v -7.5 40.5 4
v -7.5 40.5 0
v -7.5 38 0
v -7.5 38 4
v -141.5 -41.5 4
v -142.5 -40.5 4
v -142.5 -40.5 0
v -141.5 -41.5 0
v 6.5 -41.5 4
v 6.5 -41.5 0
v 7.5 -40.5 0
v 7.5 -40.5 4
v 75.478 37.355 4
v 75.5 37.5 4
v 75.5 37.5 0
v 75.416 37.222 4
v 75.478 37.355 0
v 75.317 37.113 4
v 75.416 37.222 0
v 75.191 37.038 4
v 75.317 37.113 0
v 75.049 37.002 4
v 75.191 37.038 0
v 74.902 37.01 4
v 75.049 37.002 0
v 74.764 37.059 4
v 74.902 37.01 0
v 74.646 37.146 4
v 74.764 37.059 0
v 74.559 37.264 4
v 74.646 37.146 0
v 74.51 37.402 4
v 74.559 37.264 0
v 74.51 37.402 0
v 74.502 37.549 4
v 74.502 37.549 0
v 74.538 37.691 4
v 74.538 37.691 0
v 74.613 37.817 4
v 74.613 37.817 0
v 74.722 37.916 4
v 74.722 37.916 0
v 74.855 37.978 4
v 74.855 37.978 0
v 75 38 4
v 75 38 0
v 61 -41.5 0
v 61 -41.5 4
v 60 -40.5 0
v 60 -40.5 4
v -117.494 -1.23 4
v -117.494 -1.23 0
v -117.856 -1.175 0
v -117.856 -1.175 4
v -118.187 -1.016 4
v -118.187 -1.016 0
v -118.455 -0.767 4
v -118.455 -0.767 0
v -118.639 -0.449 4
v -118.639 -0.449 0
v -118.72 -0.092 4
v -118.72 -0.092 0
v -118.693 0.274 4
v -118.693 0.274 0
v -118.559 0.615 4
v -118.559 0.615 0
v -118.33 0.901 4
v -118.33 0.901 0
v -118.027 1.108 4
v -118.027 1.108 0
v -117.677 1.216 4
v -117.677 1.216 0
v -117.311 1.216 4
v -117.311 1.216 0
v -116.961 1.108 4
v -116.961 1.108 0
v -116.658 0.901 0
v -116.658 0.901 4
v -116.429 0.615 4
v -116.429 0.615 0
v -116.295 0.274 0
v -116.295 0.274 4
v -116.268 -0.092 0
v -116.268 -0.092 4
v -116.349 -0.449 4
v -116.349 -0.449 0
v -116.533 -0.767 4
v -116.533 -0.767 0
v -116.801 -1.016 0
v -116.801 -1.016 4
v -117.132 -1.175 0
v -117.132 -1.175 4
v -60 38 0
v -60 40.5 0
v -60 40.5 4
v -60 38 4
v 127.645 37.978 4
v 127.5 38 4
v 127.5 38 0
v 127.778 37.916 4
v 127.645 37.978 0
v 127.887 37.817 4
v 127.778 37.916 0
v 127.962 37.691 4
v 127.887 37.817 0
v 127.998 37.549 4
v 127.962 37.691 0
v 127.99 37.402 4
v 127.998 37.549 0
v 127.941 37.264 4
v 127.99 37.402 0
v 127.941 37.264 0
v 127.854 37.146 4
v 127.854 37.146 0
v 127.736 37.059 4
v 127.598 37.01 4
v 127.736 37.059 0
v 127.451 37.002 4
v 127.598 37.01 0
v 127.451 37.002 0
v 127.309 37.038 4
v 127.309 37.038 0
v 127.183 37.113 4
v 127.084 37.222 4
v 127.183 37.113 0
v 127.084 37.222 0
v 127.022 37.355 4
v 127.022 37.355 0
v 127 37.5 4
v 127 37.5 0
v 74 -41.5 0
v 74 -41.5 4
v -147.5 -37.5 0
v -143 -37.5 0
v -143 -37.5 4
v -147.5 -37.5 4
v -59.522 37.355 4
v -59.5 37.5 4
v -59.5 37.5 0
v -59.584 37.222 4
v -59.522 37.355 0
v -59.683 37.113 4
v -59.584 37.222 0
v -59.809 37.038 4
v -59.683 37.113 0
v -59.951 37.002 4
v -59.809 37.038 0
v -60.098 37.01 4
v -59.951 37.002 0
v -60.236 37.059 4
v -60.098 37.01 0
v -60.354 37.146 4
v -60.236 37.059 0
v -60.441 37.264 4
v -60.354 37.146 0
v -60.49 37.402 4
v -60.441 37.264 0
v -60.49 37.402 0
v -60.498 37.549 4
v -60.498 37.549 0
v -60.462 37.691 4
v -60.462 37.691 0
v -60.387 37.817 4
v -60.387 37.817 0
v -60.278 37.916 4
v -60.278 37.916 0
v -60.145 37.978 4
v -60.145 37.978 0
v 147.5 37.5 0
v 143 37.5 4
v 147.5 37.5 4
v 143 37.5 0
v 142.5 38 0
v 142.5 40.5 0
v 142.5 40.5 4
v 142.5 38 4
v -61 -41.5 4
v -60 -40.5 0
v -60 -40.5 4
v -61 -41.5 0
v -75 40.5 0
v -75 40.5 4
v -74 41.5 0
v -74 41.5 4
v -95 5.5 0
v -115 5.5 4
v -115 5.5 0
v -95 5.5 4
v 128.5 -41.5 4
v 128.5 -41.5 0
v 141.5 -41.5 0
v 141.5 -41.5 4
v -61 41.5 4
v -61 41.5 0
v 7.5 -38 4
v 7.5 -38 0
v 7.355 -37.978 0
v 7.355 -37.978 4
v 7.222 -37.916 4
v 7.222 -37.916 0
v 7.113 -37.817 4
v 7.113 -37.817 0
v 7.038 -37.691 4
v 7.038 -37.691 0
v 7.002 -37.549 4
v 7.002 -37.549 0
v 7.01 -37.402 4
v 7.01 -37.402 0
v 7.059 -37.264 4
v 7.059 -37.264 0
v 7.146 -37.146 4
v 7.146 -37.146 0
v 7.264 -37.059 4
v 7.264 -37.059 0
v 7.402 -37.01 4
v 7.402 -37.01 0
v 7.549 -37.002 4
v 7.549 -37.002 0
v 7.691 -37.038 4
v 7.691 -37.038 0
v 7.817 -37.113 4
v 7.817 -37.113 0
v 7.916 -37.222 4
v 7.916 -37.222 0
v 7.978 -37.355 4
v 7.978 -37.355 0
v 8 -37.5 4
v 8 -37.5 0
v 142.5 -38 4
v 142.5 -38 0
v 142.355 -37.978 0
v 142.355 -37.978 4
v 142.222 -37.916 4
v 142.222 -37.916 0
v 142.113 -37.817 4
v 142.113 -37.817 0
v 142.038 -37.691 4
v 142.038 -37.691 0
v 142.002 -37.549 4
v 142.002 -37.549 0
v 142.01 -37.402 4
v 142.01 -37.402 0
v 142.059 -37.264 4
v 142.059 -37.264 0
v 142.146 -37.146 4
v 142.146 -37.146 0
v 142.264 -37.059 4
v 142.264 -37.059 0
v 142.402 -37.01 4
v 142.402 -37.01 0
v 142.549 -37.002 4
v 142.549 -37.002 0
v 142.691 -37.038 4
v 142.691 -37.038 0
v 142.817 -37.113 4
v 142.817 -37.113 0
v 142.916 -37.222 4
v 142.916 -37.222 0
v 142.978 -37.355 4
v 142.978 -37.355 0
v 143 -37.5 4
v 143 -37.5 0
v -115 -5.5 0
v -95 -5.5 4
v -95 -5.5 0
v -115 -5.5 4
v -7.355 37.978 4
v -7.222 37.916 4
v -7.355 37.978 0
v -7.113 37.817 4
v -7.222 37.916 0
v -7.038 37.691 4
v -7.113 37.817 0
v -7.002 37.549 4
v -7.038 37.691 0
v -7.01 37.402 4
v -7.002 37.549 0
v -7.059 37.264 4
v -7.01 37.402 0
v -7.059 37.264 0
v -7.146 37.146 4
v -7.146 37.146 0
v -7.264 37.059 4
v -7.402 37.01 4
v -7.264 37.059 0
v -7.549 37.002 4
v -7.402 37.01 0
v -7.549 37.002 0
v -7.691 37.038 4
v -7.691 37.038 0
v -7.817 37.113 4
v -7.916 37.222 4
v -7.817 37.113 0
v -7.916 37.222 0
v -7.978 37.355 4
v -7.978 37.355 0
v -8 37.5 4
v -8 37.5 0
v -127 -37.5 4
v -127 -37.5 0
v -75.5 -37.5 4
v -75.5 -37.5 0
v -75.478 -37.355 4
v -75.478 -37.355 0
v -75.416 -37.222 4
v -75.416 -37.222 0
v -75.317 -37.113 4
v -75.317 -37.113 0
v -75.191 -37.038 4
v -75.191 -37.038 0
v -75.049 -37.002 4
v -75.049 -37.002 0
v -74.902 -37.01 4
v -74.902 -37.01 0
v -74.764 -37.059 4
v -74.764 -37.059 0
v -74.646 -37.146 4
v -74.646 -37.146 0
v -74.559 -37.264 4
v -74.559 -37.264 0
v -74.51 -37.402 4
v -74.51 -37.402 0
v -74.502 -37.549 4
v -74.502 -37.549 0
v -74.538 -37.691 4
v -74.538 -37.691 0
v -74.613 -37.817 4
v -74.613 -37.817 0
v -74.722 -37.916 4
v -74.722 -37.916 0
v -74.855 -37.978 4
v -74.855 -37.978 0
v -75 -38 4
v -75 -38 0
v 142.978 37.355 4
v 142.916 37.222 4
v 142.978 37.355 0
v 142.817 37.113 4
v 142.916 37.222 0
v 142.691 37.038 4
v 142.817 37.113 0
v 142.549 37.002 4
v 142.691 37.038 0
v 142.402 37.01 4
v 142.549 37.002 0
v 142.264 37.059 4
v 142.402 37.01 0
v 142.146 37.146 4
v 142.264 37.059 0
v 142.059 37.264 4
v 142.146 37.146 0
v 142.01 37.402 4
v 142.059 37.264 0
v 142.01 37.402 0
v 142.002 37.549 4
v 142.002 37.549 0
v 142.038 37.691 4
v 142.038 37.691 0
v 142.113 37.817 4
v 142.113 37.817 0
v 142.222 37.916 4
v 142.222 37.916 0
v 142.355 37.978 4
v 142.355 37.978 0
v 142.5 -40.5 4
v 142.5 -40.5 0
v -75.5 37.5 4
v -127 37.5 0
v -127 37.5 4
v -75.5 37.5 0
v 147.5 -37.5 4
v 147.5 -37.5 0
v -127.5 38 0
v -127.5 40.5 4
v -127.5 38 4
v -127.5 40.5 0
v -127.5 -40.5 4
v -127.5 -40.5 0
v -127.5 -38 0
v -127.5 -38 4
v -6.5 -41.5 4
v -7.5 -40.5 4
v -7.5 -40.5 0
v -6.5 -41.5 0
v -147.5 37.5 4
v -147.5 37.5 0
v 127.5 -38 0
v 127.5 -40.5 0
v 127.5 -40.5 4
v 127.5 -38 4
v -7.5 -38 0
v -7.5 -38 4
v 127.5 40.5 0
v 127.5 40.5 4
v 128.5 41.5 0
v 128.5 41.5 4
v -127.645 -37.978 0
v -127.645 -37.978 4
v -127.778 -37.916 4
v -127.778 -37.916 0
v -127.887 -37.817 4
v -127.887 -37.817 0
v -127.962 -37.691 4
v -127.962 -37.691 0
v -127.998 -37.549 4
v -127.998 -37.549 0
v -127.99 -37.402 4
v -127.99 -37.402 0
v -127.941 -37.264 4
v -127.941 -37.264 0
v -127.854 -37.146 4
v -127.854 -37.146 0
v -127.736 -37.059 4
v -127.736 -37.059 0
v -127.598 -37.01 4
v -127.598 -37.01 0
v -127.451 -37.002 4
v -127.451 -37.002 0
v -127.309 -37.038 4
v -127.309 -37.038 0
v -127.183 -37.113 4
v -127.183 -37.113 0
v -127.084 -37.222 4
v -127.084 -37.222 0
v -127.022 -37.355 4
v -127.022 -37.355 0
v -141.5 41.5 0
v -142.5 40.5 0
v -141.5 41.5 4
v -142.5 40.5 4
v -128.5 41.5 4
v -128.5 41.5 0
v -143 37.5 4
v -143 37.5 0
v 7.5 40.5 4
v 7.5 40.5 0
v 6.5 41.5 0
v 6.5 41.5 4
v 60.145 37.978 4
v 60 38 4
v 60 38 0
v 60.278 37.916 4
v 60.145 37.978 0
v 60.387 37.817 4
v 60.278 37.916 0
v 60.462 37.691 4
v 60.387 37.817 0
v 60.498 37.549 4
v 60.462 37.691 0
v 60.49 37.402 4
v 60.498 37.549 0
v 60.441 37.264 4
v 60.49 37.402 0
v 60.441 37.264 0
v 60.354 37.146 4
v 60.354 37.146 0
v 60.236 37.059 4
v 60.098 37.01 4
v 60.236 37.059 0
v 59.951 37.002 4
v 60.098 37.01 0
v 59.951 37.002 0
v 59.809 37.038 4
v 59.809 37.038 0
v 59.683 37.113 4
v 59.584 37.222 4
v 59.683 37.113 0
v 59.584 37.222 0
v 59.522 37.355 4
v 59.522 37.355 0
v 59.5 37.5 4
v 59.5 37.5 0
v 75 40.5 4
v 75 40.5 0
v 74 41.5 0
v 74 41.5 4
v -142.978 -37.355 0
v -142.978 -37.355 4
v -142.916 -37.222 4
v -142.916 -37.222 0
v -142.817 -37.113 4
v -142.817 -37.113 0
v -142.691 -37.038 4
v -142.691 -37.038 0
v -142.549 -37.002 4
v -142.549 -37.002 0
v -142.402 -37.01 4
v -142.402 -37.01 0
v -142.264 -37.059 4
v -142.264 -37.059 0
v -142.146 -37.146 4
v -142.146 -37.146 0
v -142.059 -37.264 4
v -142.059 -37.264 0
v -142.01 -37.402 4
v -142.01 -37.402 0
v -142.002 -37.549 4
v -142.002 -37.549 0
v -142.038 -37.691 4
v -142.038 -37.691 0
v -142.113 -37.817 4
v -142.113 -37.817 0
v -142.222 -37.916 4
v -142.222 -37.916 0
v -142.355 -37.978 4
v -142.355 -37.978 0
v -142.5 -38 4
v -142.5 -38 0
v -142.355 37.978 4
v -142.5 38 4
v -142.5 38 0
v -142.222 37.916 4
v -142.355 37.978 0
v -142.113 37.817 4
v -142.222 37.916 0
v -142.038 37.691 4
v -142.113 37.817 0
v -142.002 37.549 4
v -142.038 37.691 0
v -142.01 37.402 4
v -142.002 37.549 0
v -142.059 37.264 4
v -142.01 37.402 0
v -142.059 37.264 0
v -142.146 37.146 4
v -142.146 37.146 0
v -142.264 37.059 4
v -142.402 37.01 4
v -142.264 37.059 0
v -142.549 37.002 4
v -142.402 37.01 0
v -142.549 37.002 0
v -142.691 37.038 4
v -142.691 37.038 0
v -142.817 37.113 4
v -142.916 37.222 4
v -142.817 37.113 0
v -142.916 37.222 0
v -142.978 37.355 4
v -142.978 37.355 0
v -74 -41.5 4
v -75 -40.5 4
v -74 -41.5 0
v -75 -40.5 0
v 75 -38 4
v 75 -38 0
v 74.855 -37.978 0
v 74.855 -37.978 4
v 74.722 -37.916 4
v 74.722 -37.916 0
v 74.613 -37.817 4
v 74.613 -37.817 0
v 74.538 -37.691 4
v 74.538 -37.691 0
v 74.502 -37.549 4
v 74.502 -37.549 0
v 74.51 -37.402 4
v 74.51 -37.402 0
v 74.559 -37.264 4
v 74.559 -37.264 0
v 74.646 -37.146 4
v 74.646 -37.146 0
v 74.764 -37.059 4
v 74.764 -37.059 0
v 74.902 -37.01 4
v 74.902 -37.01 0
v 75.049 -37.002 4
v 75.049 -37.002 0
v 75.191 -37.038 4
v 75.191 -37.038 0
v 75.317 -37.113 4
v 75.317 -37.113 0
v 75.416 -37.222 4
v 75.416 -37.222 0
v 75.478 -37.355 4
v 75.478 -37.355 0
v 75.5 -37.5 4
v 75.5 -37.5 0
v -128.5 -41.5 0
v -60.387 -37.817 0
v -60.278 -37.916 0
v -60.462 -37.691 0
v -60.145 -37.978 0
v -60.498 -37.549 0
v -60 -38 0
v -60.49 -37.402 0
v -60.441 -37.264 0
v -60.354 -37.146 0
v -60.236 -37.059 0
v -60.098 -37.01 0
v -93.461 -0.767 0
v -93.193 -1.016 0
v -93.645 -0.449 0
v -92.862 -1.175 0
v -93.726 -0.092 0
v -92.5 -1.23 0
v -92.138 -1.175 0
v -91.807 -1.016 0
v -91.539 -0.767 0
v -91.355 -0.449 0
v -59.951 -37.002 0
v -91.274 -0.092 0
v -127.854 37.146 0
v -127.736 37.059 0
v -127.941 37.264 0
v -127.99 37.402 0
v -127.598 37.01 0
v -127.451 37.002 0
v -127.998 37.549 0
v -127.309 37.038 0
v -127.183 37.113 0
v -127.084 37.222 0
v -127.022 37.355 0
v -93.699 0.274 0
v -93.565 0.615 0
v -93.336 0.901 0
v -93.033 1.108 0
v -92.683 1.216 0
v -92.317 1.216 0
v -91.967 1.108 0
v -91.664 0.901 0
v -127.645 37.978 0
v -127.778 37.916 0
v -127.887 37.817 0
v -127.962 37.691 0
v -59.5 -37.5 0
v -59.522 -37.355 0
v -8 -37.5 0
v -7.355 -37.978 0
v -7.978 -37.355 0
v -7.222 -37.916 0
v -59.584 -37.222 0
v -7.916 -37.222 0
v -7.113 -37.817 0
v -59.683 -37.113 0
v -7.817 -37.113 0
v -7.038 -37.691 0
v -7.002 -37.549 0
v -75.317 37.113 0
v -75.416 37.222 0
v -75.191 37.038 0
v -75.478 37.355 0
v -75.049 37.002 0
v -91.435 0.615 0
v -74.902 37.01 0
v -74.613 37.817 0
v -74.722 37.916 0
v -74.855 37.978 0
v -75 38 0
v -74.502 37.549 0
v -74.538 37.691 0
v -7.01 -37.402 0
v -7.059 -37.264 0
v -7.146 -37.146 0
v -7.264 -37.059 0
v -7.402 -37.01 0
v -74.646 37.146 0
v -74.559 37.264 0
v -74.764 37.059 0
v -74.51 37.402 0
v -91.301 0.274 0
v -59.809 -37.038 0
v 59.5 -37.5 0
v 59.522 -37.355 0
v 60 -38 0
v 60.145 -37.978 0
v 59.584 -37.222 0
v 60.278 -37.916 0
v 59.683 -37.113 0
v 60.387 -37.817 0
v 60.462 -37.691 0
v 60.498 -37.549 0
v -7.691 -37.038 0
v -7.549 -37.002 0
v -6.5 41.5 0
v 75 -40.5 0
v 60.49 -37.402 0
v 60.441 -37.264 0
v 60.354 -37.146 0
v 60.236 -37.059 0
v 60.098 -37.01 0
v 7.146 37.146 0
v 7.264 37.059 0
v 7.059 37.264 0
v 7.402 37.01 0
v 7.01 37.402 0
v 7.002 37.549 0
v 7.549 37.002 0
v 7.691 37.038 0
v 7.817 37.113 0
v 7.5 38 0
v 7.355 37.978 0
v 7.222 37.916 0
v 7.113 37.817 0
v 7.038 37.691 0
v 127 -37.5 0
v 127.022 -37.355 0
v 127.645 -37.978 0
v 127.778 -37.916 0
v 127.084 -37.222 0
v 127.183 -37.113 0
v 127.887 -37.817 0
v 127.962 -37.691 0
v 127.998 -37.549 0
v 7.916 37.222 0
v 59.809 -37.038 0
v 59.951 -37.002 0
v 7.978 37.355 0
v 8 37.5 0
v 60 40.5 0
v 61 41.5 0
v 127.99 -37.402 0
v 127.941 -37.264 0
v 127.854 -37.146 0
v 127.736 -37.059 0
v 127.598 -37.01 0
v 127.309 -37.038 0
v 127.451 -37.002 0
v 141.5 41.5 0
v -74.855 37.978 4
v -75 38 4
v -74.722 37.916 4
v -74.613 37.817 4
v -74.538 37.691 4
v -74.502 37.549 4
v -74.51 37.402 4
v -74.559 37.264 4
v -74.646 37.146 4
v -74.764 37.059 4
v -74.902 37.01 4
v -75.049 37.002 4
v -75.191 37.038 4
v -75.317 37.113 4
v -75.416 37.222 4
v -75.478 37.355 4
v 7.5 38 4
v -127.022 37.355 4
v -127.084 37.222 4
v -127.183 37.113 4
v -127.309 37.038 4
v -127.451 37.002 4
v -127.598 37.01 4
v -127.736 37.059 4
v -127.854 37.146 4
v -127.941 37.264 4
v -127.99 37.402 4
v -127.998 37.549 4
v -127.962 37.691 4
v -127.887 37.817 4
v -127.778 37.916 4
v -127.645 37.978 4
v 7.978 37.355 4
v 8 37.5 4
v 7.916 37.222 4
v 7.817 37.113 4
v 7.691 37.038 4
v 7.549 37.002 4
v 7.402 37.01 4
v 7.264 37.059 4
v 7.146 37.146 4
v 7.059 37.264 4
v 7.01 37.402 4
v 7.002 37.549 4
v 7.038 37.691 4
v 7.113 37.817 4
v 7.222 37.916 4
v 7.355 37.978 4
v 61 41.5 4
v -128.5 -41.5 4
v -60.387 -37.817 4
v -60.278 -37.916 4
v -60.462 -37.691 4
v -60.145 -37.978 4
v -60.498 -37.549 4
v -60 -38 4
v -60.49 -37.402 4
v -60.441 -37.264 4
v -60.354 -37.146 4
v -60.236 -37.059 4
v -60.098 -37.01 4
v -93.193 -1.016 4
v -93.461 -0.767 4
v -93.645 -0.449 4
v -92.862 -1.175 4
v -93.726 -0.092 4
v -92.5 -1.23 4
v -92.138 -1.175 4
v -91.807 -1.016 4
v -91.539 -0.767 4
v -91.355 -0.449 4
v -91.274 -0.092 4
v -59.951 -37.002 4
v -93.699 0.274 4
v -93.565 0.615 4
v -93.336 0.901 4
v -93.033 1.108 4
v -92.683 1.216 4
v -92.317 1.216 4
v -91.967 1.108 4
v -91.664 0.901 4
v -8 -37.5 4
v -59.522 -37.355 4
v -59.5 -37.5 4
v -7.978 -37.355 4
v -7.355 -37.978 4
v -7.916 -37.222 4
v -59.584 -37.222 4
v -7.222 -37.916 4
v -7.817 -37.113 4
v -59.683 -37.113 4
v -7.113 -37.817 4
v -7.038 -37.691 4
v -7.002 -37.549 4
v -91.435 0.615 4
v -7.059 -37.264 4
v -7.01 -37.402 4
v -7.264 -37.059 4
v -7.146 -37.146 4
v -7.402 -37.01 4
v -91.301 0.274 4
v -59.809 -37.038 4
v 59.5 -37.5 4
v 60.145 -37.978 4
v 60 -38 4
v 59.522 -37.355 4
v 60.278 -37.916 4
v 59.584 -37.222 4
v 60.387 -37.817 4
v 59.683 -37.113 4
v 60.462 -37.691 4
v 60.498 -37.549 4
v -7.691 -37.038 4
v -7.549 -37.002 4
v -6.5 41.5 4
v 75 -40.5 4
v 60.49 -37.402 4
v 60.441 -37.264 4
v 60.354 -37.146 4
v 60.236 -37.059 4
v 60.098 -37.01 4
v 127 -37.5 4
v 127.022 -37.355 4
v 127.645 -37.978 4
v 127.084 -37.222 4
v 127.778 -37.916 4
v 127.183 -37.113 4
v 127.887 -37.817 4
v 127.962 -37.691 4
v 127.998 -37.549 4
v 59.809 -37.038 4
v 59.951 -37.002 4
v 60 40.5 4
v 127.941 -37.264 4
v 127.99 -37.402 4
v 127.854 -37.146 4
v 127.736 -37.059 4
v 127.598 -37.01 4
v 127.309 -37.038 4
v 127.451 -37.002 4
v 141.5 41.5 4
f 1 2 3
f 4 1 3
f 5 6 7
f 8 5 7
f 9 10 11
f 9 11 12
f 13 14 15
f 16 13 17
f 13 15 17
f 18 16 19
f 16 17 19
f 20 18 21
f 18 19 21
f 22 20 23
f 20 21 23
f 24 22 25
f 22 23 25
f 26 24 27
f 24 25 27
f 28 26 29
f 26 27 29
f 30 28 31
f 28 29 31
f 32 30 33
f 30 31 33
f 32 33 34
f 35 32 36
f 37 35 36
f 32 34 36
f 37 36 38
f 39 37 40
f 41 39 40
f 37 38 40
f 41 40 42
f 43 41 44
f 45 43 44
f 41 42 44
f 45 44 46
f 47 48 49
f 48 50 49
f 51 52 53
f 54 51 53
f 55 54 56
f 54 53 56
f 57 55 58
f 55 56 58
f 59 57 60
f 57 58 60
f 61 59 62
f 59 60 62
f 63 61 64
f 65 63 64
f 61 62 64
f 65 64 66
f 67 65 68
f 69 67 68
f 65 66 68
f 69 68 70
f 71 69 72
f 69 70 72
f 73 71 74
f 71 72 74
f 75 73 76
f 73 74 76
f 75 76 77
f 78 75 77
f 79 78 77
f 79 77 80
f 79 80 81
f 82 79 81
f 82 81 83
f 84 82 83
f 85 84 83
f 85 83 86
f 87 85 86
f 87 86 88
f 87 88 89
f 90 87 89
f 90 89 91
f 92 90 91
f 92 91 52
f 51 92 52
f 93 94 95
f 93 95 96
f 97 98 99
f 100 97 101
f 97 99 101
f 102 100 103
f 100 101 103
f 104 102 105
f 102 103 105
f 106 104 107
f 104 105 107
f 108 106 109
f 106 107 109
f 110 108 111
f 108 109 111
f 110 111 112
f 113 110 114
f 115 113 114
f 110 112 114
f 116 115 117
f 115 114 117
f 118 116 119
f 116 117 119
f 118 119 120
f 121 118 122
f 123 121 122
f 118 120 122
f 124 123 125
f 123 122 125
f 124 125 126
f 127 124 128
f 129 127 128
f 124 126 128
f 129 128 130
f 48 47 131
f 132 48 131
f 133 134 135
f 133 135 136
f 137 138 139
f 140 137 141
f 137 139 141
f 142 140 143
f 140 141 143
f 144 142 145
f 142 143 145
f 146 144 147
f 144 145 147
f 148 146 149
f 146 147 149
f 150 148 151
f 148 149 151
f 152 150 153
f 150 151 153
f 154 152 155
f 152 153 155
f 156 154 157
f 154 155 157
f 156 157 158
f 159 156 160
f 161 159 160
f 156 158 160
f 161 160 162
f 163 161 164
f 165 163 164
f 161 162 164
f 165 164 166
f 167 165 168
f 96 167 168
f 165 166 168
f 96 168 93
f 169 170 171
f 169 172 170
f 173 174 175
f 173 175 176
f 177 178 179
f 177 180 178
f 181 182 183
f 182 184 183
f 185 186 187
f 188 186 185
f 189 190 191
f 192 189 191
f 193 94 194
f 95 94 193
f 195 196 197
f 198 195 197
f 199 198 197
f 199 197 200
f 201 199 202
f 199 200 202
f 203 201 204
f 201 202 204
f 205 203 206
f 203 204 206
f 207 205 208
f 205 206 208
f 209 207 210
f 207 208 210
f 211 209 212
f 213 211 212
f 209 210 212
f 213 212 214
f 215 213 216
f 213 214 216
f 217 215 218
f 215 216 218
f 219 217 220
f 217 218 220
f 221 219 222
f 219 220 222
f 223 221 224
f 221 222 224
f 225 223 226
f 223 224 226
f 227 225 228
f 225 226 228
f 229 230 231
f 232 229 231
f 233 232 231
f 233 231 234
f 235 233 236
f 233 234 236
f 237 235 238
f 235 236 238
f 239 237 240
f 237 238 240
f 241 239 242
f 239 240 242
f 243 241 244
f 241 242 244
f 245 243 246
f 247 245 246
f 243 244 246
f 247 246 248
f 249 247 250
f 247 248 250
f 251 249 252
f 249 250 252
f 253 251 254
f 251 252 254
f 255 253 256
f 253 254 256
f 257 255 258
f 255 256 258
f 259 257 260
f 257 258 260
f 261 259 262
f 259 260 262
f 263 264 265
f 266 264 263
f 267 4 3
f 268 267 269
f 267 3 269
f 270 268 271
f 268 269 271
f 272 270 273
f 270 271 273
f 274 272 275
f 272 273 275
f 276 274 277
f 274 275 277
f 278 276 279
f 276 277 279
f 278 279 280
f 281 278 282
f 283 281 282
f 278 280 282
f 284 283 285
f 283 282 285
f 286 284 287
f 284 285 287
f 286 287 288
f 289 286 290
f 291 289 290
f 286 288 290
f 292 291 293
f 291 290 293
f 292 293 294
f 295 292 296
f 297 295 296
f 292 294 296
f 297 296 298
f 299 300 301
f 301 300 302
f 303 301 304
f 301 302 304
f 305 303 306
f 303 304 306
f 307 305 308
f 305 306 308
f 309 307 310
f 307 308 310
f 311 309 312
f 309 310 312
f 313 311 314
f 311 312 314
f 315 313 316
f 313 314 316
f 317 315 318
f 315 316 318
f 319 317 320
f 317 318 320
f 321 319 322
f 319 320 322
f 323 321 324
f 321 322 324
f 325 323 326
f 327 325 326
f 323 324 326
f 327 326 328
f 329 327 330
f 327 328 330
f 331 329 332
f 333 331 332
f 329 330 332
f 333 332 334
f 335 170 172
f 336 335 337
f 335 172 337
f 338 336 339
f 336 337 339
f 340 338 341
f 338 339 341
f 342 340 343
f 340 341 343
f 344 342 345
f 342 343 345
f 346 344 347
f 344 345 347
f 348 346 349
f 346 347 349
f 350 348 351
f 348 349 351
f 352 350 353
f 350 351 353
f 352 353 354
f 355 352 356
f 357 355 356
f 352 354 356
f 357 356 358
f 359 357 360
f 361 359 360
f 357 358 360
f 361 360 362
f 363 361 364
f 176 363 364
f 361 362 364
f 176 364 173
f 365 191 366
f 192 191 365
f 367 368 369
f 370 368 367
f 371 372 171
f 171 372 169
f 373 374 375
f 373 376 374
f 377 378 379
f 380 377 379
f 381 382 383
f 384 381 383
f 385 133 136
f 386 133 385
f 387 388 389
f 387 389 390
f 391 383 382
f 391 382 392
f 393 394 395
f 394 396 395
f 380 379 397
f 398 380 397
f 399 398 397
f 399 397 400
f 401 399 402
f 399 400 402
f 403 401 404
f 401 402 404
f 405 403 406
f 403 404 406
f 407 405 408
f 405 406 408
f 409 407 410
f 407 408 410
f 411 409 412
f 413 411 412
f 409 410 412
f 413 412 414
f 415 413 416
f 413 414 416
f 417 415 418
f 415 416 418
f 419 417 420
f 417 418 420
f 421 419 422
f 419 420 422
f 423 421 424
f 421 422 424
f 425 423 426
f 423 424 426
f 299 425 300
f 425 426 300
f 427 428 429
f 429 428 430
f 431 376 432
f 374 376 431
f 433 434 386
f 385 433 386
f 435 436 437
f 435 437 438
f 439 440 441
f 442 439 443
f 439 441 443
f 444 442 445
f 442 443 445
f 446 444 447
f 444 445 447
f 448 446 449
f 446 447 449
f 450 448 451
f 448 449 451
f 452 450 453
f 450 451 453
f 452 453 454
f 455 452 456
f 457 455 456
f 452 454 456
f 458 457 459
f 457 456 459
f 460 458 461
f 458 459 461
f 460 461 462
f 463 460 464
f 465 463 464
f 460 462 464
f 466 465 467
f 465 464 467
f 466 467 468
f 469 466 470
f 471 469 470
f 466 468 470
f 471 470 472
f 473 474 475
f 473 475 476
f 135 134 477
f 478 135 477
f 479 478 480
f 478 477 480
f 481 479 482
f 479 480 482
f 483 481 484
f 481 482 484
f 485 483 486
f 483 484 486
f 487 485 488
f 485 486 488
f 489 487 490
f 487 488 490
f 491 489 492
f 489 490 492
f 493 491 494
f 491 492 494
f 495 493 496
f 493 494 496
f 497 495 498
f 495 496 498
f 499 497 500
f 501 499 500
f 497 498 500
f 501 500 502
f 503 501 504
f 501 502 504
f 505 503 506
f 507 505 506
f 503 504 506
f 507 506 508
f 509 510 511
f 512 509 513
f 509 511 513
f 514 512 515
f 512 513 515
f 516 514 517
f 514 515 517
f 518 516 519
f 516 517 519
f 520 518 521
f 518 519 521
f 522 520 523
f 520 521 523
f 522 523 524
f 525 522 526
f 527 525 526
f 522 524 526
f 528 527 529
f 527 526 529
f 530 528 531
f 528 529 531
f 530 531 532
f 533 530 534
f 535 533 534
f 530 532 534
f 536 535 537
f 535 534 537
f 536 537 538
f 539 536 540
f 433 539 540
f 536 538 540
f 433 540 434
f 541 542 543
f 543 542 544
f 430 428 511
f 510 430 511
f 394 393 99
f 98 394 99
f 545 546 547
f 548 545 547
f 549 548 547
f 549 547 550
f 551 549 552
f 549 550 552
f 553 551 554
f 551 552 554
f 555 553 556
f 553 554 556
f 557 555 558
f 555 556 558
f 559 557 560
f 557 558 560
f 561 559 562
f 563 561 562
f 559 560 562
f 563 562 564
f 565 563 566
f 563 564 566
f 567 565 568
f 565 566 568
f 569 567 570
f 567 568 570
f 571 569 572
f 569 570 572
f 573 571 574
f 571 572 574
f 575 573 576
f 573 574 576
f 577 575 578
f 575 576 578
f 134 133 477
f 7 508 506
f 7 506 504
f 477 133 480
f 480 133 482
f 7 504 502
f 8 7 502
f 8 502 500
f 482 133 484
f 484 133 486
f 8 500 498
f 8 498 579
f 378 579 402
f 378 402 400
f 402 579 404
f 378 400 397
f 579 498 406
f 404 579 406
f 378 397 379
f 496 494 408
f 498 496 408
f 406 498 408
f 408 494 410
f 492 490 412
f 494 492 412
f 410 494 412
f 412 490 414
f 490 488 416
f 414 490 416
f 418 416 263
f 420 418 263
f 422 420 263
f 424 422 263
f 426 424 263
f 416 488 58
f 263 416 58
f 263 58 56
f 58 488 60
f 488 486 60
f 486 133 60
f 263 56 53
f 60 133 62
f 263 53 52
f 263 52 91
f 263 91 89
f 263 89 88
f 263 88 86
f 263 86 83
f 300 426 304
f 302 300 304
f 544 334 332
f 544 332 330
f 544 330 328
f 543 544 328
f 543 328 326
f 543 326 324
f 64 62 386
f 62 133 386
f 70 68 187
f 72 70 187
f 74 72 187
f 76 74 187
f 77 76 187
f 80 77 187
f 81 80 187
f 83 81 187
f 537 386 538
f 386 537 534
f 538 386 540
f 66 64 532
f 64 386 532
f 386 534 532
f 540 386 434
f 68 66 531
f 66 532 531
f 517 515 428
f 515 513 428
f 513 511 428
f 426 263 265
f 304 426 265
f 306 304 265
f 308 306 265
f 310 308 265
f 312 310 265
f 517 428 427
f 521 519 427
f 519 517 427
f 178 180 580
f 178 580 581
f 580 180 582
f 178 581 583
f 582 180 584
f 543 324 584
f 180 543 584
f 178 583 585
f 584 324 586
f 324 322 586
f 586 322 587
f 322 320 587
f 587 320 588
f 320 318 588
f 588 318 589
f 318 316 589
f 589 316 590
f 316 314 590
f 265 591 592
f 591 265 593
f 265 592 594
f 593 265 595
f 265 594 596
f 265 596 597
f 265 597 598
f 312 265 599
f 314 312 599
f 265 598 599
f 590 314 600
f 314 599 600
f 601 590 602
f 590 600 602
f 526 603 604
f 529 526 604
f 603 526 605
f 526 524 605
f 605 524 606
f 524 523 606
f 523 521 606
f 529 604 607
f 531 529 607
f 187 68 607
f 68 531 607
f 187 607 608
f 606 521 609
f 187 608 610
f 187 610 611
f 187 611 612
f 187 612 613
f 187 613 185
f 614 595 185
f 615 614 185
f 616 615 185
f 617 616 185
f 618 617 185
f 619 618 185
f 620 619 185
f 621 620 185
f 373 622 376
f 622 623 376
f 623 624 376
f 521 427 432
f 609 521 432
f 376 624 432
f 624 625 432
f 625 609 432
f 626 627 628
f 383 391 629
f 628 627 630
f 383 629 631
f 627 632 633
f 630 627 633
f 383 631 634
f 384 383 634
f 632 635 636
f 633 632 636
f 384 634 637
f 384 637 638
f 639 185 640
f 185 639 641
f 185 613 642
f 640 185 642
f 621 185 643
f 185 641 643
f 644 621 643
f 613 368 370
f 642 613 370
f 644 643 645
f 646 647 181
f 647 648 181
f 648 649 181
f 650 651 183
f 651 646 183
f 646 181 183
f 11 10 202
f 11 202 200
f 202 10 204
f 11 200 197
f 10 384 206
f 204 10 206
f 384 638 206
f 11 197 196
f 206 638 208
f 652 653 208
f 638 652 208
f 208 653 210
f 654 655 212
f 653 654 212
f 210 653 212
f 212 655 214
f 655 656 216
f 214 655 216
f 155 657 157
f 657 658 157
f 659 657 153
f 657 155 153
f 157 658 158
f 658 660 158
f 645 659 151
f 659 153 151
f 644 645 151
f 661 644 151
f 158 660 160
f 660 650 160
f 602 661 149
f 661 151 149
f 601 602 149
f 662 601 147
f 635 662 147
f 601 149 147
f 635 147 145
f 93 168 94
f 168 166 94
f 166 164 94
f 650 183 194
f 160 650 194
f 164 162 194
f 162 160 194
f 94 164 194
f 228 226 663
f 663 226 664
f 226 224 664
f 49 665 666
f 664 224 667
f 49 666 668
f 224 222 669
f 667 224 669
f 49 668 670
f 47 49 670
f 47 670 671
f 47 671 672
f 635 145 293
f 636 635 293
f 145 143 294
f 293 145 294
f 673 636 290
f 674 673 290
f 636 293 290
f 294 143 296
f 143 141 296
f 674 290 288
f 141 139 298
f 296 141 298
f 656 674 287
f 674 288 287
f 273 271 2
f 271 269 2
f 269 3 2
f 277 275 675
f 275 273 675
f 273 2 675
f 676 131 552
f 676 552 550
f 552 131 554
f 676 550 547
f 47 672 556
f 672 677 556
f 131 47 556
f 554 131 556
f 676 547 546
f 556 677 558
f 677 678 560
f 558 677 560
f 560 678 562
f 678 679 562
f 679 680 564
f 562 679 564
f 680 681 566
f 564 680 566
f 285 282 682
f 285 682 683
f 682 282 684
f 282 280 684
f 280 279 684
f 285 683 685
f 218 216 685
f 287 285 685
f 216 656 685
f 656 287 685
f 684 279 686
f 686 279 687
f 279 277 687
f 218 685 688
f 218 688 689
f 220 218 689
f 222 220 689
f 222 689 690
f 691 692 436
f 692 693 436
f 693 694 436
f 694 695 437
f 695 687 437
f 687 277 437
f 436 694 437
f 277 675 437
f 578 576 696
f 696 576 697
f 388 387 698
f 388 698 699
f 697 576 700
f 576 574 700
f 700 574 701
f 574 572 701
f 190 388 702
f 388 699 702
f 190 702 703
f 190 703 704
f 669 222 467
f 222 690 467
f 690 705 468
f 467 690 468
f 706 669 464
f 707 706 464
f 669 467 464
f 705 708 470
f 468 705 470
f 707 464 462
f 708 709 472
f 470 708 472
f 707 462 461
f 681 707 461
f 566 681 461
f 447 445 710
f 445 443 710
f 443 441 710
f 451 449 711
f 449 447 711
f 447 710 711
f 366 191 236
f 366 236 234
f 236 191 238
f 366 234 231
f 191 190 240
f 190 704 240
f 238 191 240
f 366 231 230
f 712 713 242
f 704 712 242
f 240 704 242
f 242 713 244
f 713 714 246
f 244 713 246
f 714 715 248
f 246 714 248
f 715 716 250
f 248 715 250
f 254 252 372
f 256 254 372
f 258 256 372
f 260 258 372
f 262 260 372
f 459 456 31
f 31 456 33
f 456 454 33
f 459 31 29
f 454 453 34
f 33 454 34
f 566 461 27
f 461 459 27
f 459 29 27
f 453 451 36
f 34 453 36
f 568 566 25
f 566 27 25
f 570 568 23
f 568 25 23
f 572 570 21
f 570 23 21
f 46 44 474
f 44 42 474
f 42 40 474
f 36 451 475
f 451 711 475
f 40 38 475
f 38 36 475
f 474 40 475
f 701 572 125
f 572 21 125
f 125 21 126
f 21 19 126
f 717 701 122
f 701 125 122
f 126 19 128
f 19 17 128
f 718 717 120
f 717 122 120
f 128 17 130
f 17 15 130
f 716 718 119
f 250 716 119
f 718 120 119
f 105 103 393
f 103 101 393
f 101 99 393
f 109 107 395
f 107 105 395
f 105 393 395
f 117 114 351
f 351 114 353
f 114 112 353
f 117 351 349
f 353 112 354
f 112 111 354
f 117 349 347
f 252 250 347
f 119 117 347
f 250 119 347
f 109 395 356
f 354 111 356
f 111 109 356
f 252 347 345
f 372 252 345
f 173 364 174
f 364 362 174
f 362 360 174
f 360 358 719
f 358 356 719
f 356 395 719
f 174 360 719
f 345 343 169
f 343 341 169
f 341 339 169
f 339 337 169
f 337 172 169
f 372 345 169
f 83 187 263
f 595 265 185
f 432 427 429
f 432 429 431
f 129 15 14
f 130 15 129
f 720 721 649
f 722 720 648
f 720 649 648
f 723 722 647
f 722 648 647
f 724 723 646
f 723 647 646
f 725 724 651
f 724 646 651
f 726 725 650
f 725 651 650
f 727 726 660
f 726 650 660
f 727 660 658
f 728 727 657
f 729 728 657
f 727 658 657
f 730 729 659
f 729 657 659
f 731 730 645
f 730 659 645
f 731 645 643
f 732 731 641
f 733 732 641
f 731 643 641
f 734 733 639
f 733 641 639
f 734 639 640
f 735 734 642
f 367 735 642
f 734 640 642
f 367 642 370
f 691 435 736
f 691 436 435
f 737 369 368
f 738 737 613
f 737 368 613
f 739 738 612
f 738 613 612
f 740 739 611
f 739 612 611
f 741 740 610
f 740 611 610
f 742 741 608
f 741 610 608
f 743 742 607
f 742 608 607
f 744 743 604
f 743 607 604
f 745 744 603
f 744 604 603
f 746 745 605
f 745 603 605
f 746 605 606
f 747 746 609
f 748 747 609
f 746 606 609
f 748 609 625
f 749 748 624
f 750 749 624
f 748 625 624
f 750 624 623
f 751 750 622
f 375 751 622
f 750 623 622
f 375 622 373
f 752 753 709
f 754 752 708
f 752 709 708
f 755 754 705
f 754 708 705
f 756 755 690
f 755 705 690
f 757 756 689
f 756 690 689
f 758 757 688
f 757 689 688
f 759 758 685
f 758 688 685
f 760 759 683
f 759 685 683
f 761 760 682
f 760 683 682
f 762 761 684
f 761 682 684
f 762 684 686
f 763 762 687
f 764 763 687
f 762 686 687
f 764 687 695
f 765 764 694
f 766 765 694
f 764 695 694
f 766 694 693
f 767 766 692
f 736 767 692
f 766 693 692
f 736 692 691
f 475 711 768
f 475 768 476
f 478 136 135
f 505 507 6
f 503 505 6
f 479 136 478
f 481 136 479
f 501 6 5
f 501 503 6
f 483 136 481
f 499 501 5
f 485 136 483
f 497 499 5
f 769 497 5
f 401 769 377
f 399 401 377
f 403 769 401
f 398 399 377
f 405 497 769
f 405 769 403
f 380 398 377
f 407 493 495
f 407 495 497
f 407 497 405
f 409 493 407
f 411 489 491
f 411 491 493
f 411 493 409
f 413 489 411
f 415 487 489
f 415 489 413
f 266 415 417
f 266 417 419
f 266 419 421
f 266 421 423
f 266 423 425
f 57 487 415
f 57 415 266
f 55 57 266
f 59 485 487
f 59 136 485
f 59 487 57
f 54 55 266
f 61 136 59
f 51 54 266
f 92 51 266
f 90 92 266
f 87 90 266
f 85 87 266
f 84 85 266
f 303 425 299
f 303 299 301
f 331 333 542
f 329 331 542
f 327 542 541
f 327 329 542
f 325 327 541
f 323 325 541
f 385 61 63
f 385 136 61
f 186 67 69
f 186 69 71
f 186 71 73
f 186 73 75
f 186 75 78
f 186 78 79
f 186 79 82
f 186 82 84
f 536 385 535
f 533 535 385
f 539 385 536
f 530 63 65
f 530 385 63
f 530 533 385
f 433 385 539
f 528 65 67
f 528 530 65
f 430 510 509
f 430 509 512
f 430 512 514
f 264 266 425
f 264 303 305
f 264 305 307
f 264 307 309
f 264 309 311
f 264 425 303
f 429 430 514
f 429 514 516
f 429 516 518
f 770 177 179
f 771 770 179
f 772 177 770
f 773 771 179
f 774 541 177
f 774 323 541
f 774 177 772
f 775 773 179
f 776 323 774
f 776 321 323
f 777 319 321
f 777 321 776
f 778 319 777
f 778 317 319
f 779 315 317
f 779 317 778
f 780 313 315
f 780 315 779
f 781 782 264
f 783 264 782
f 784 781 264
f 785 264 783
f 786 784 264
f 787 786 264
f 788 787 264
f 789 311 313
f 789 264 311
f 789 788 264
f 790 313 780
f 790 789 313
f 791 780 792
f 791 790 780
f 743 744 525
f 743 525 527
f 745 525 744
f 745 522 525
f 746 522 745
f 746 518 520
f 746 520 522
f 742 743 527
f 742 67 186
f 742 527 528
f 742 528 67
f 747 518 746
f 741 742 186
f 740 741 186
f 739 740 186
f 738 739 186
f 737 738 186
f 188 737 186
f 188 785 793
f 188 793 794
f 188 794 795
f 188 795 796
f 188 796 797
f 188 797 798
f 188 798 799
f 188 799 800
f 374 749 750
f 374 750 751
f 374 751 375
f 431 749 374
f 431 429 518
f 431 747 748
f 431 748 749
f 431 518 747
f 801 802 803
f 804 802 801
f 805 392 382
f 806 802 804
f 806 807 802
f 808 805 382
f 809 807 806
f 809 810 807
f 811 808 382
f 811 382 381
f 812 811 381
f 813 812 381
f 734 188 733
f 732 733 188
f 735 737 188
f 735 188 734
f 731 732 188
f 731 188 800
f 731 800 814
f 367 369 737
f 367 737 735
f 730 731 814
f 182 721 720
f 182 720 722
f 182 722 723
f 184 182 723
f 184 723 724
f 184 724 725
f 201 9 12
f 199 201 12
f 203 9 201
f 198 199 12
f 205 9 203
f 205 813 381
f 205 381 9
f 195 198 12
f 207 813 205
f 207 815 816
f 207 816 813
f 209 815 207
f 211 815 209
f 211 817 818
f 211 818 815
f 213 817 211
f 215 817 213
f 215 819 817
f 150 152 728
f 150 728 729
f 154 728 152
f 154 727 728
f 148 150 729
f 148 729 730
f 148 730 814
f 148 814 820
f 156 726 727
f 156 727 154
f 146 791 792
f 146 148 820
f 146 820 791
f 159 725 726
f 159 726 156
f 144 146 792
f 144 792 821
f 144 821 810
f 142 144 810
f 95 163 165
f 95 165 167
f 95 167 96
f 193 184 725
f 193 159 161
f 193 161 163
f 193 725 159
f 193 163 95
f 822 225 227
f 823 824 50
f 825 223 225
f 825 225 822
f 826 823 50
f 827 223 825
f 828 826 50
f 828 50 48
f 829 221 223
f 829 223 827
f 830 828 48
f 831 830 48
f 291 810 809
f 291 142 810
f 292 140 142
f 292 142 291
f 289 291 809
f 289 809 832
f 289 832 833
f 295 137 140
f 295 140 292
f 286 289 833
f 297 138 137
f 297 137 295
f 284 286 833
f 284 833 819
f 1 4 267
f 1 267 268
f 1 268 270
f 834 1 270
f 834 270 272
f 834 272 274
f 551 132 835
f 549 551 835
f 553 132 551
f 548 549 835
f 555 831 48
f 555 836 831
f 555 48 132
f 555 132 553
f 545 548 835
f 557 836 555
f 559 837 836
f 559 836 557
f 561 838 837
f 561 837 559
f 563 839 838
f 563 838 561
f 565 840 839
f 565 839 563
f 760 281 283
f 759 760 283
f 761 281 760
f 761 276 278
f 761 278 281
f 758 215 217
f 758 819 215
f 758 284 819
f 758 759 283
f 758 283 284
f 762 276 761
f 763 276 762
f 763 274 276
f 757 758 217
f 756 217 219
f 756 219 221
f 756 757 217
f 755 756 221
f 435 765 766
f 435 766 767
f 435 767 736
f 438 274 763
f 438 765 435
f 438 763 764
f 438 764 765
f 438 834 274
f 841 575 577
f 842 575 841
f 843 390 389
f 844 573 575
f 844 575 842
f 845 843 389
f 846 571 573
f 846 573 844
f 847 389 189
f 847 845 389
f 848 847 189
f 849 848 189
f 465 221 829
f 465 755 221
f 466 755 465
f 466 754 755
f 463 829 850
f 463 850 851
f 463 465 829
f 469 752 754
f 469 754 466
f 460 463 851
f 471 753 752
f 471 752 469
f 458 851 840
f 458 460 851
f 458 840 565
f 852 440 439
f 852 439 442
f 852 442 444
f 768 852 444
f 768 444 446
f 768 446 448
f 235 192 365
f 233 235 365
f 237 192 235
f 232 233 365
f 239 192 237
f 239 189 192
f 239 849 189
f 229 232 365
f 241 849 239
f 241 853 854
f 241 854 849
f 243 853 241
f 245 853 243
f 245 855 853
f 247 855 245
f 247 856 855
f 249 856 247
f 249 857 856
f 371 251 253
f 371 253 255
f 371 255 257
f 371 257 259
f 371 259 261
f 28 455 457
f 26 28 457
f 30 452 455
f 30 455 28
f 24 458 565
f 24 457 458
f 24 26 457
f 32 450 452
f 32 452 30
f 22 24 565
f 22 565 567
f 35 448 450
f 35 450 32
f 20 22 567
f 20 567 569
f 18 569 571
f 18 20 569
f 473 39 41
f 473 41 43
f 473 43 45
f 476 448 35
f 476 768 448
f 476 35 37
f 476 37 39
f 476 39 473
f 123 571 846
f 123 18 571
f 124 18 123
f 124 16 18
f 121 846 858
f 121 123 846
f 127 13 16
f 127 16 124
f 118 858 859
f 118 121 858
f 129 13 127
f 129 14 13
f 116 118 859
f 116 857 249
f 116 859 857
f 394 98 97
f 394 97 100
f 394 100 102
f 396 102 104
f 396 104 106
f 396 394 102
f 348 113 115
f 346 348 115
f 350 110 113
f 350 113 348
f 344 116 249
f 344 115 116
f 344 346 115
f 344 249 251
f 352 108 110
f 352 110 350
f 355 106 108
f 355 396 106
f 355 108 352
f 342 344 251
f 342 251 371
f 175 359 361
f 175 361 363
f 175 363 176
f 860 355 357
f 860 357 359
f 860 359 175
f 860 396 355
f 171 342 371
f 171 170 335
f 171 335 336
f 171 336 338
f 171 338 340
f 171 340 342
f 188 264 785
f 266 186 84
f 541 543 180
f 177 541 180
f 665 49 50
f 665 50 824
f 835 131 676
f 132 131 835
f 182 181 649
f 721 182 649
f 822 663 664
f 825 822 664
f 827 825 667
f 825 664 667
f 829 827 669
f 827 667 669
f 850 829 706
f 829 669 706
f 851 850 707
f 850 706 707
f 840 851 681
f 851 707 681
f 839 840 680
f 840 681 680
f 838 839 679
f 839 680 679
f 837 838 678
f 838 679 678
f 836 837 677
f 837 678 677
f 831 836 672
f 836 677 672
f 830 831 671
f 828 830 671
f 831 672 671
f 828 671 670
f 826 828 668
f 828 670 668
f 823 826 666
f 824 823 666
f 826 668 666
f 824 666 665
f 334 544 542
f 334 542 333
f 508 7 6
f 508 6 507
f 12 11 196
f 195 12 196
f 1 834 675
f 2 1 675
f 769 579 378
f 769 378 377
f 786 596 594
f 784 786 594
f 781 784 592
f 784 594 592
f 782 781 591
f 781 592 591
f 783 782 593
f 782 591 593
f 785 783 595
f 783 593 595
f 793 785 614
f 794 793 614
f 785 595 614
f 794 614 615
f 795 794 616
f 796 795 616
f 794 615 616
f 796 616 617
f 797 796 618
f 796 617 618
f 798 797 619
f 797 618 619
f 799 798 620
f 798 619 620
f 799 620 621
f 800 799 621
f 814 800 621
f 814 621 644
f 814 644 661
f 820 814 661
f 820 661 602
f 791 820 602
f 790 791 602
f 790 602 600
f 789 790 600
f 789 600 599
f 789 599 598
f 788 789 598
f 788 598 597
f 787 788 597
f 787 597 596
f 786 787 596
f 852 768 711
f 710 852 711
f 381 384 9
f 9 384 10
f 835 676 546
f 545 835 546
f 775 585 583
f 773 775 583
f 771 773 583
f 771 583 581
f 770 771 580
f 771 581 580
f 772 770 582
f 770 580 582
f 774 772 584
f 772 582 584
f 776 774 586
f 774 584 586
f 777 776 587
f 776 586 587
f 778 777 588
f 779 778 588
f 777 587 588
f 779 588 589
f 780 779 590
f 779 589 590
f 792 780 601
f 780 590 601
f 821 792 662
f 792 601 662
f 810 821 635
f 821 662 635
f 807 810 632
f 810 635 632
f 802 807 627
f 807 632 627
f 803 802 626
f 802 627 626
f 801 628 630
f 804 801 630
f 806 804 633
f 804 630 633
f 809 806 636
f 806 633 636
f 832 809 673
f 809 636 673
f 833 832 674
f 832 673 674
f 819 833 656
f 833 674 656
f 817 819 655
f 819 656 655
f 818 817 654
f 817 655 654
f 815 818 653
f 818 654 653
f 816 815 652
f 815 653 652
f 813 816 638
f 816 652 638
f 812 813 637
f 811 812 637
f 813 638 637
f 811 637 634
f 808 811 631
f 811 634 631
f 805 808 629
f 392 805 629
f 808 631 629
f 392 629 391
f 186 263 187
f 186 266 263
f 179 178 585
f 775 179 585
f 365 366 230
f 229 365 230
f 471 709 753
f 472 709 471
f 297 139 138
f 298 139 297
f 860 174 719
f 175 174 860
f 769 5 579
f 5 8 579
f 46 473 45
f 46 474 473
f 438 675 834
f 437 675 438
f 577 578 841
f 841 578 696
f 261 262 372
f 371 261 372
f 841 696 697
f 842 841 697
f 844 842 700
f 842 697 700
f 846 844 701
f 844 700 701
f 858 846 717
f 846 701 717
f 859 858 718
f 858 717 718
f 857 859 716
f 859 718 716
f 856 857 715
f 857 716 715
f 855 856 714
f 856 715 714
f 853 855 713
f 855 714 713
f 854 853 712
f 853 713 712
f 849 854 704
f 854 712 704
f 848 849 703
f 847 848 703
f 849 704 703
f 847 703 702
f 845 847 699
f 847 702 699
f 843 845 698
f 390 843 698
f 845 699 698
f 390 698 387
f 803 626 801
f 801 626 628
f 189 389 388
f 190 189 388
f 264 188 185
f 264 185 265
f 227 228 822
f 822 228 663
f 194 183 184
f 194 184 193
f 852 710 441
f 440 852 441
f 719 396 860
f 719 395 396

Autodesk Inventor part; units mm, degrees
ref_plane "Plan YZ" through (0, 0, 0) normal (1, 0, 0) x (0, 1, 0)
ref_plane "Plan XZ" through (0, 0, 0) normal (0, 1, 0) x (-1, 0, 0)
ref_plane "Plan XY" through (0, 0, 0) normal (0, 0, 1) x (1, 0, 0)
sketch "Esquisse1" plane through (0, 0, 0) normal (0, 0, 1) x (1, 0, 0)
  line L0 (-142.5, 41.5) -> (-142.5, 37.5)
  line L1 (-142.5, 41.5) -> (-127.5, 41.5)
  line L2 (-127.5, 41.5) -> (-127.5, 37.5)
  line L3 (0, -58.1) -> (0, 58.1) construction
  line L4 (-206.5, 0) -> (206.5, 0) construction
  line L5 (-75, 41.5) -> (-75, 37.5)
  line L6 (-75, 41.5) -> (-60, 41.5)
  line L7 (-60, 41.5) -> (-60, 37.5)
  line L8 (-7.5, 41.5) -> (-7.5, 37.5)
  line L9 (-7.5, 41.5) -> (7.5, 41.5)
  line L10 (7.5, 41.5) -> (7.5, 37.5)
  line L11 (60, 41.5) -> (60, 37.5)
  line L12 (60, 41.5) -> (75, 41.5)
  line L13 (75, 41.5) -> (75, 37.5)
  line L14 (127.5, 41.5) -> (127.5, 37.5)
  line L15 (127.5, 41.5) -> (142.5, 41.5)
  line L16 (142.5, 41.5) -> (142.5, 37.5)
  line L17 (-127.5, 37.5) -> (-75, 37.5)
  line L18 (-60, 37.5) -> (-7.5, 37.5)
  line L19 (7.5, 37.5) -> (60, 37.5)
  line L20 (75, 37.5) -> (127.5, 37.5)
  line L21 (142.5, 37.5) -> (147.5, 37.5)
  line L22 (-142.5, 37.5) -> (-147.5, 37.5)
  line L23 (-142.5, -41.5) -> (-142.5, -37.5)
  line L24 (-142.5, -41.5) -> (-127.5, -41.5)
  line L25 (-127.5, -41.5) -> (-127.5, -37.5)
  line L26 (-75, -41.5) -> (-75, -37.5)
  line L27 (-75, -41.5) -> (-60, -41.5)
  line L28 (-60, -41.5) -> (-60, -37.5)
  line L29 (-7.5, -41.5) -> (-7.5, -37.5)
  line L30 (-7.5, -41.5) -> (7.5, -41.5)
  line L31 (7.5, -41.5) -> (7.5, -37.5)
  line L32 (60, -41.5) -> (60, -37.5)
  line L33 (60, -41.5) -> (75, -41.5)
  line L34 (75, -41.5) -> (75, -37.5)
  line L35 (127.5, -41.5) -> (127.5, -37.5)
  line L36 (127.5, -41.5) -> (142.5, -41.5)
  line L37 (142.5, -41.5) -> (142.5, -37.5)
  line L38 (-127.5, -37.5) -> (-75, -37.5)
  line L39 (-60, -37.5) -> (-7.5, -37.5)
  line L40 (7.5, -37.5) -> (60, -37.5)
  line L41 (75, -37.5) -> (127.5, -37.5)
  line L42 (142.5, -37.5) -> (147.5, -37.5)
  line L43 (-142.5, -37.5) -> (-147.5, -37.5)
  line L44 (147.5, -37.5) -> (147.5, 37.5)
  line L45 (-147.5, -37.5) -> (-147.5, 37.5)
  point P0 (0, 0)
  dimension "d1" = 15
  dimension "d2" = 4
  dimension "d3" = 4
  dimension "d6" = 67.5
  dimension "d11" = 5
  dimension "d12" = 5
  dimension "d30" = 75
extrude "Extrusion1" add sketch "Esquisse1" along normal blind 4
sketch "Esquisse6" plane through (0, 0, 4) normal (0, 0, 1) x (1, 0, 0)
  line L0 (0, -58.1) -> (0, 58.1) construction
  line L1 (-206.5, 0) -> (206.5, 0) construction
  point P0 (0, 0)
  point P1 (-142.5, 37.5)
  point P2 (-127.5, 37.5)
  point P3 (-75, 37.5)
  point P4 (-60, 37.5)
  point P5 (-7.5, 37.5)
  point P6 (7.5, 37.5)
  point P7 (60, 37.5)
  point P8 (75, 37.5)
  point P9 (142.5, 37.5)
  point P10 (127.5, 37.5)
  point P11 (-142.5, -37.5)
  point P12 (-127.5, -37.5)
  point P13 (-75, -37.5)
  point P14 (-60, -37.5)
  point P15 (-7.5, -37.5)
  point P16 (7.5, -37.5)
  point P17 (60, -37.5)
  point P18 (75, -37.5)
  point P19 (142.5, -37.5)
  point P20 (127.5, -37.5)
hole "Perçage1" at (-142.5, 37.5, 4) at (-127.5, 37.5, 4) at (-75, 37.5, 4) at (-60, 37.5, 4) at (-7.5, 37.5, 4) at (7.5, 37.5, 4) at (60, 37.5, 4) at (75, 37.5, 4) at (142.5, 37.5, 4) at (127.5, 37.5, 4) at (127.5, -37.5, 4) at (142.5, -37.5, 4) at (75, -37.5, 4) at (60, -37.5, 4) at (7.5, -37.5, 4) at (-7.5, -37.5, 4) at (-60, -37.5, 4) at (-75, -37.5, 4) at (-127.5, -37.5, 4) at (-142.5, -37.5, 4) direction (0, 0, -1) diameter 1 end through all
chamfer "Chanfrein1" distance 1 angle 45 20 edges at (-142.5, 41.5, 2) (-127.5, 41.5, 2) (-75, 41.5, 2) (-60, 41.5, 2) (-7.5, 41.5, 2) (7.5, 41.5, 2) (60, 41.5, 2) (75, 41.5, 2) (127.5, 41.5, 2) (142.5, 41.5, 2) (142.5, -41.5, 2) (127.5, -41.5, 2) (60, -41.5, 2) (75, -41.5, 2) (-142.5, -41.5, 2) (-127.5, -41.5, 2) (-75, -41.5, 2) (-60, -41.5, 2) (-7.5, -41.5, 2) (7.5, -41.5, 2)
sketch "Esquisse10" plane through (0, 0, 4) normal (0, 0, 1) x (1, 0, 0)
  line L0 (0, -58.1) -> (0, 58.1) construction
  line L1 (-206.5, 0) -> (206.5, 0) construction
  line L2 (-115, 5.5) -> (-95, 5.5)
  line L3 (-95, 5.5) -> (-95, -5.5)
  line L4 (-95, -5.5) -> (-115, -5.5)
  line L5 (-115, -5.5) -> (-115, 5.5)
  dimension "d61" = 95
  dimension "d62" = 20
  dimension "d63" = 11
sketch "Esquisse11" plane through (0, 0, 4) normal (0, 0, 1) x (1, 0, 0)
  line L0 (-206.5, 0) -> (206.5, 0) construction
  point P0 (0, 0)
  point P1 (-117.494, 0)
  point P2 (-92.5, 0)
  dimension "d66" = 24.994
  dimension "d69" = 92.5
extrude "Extrusion4" cut sketch "Esquisse10" against normal blind 10
hole "Perçage5" at (-117.494, 0, 4) at (-92.5, 0, 4) direction (0, 0, -1) diameter 2.459 end through all thread size "M3x0.5" class "6H" standard "ISO M"
properties part number "P1704_004" material "Plastique PMMA"
